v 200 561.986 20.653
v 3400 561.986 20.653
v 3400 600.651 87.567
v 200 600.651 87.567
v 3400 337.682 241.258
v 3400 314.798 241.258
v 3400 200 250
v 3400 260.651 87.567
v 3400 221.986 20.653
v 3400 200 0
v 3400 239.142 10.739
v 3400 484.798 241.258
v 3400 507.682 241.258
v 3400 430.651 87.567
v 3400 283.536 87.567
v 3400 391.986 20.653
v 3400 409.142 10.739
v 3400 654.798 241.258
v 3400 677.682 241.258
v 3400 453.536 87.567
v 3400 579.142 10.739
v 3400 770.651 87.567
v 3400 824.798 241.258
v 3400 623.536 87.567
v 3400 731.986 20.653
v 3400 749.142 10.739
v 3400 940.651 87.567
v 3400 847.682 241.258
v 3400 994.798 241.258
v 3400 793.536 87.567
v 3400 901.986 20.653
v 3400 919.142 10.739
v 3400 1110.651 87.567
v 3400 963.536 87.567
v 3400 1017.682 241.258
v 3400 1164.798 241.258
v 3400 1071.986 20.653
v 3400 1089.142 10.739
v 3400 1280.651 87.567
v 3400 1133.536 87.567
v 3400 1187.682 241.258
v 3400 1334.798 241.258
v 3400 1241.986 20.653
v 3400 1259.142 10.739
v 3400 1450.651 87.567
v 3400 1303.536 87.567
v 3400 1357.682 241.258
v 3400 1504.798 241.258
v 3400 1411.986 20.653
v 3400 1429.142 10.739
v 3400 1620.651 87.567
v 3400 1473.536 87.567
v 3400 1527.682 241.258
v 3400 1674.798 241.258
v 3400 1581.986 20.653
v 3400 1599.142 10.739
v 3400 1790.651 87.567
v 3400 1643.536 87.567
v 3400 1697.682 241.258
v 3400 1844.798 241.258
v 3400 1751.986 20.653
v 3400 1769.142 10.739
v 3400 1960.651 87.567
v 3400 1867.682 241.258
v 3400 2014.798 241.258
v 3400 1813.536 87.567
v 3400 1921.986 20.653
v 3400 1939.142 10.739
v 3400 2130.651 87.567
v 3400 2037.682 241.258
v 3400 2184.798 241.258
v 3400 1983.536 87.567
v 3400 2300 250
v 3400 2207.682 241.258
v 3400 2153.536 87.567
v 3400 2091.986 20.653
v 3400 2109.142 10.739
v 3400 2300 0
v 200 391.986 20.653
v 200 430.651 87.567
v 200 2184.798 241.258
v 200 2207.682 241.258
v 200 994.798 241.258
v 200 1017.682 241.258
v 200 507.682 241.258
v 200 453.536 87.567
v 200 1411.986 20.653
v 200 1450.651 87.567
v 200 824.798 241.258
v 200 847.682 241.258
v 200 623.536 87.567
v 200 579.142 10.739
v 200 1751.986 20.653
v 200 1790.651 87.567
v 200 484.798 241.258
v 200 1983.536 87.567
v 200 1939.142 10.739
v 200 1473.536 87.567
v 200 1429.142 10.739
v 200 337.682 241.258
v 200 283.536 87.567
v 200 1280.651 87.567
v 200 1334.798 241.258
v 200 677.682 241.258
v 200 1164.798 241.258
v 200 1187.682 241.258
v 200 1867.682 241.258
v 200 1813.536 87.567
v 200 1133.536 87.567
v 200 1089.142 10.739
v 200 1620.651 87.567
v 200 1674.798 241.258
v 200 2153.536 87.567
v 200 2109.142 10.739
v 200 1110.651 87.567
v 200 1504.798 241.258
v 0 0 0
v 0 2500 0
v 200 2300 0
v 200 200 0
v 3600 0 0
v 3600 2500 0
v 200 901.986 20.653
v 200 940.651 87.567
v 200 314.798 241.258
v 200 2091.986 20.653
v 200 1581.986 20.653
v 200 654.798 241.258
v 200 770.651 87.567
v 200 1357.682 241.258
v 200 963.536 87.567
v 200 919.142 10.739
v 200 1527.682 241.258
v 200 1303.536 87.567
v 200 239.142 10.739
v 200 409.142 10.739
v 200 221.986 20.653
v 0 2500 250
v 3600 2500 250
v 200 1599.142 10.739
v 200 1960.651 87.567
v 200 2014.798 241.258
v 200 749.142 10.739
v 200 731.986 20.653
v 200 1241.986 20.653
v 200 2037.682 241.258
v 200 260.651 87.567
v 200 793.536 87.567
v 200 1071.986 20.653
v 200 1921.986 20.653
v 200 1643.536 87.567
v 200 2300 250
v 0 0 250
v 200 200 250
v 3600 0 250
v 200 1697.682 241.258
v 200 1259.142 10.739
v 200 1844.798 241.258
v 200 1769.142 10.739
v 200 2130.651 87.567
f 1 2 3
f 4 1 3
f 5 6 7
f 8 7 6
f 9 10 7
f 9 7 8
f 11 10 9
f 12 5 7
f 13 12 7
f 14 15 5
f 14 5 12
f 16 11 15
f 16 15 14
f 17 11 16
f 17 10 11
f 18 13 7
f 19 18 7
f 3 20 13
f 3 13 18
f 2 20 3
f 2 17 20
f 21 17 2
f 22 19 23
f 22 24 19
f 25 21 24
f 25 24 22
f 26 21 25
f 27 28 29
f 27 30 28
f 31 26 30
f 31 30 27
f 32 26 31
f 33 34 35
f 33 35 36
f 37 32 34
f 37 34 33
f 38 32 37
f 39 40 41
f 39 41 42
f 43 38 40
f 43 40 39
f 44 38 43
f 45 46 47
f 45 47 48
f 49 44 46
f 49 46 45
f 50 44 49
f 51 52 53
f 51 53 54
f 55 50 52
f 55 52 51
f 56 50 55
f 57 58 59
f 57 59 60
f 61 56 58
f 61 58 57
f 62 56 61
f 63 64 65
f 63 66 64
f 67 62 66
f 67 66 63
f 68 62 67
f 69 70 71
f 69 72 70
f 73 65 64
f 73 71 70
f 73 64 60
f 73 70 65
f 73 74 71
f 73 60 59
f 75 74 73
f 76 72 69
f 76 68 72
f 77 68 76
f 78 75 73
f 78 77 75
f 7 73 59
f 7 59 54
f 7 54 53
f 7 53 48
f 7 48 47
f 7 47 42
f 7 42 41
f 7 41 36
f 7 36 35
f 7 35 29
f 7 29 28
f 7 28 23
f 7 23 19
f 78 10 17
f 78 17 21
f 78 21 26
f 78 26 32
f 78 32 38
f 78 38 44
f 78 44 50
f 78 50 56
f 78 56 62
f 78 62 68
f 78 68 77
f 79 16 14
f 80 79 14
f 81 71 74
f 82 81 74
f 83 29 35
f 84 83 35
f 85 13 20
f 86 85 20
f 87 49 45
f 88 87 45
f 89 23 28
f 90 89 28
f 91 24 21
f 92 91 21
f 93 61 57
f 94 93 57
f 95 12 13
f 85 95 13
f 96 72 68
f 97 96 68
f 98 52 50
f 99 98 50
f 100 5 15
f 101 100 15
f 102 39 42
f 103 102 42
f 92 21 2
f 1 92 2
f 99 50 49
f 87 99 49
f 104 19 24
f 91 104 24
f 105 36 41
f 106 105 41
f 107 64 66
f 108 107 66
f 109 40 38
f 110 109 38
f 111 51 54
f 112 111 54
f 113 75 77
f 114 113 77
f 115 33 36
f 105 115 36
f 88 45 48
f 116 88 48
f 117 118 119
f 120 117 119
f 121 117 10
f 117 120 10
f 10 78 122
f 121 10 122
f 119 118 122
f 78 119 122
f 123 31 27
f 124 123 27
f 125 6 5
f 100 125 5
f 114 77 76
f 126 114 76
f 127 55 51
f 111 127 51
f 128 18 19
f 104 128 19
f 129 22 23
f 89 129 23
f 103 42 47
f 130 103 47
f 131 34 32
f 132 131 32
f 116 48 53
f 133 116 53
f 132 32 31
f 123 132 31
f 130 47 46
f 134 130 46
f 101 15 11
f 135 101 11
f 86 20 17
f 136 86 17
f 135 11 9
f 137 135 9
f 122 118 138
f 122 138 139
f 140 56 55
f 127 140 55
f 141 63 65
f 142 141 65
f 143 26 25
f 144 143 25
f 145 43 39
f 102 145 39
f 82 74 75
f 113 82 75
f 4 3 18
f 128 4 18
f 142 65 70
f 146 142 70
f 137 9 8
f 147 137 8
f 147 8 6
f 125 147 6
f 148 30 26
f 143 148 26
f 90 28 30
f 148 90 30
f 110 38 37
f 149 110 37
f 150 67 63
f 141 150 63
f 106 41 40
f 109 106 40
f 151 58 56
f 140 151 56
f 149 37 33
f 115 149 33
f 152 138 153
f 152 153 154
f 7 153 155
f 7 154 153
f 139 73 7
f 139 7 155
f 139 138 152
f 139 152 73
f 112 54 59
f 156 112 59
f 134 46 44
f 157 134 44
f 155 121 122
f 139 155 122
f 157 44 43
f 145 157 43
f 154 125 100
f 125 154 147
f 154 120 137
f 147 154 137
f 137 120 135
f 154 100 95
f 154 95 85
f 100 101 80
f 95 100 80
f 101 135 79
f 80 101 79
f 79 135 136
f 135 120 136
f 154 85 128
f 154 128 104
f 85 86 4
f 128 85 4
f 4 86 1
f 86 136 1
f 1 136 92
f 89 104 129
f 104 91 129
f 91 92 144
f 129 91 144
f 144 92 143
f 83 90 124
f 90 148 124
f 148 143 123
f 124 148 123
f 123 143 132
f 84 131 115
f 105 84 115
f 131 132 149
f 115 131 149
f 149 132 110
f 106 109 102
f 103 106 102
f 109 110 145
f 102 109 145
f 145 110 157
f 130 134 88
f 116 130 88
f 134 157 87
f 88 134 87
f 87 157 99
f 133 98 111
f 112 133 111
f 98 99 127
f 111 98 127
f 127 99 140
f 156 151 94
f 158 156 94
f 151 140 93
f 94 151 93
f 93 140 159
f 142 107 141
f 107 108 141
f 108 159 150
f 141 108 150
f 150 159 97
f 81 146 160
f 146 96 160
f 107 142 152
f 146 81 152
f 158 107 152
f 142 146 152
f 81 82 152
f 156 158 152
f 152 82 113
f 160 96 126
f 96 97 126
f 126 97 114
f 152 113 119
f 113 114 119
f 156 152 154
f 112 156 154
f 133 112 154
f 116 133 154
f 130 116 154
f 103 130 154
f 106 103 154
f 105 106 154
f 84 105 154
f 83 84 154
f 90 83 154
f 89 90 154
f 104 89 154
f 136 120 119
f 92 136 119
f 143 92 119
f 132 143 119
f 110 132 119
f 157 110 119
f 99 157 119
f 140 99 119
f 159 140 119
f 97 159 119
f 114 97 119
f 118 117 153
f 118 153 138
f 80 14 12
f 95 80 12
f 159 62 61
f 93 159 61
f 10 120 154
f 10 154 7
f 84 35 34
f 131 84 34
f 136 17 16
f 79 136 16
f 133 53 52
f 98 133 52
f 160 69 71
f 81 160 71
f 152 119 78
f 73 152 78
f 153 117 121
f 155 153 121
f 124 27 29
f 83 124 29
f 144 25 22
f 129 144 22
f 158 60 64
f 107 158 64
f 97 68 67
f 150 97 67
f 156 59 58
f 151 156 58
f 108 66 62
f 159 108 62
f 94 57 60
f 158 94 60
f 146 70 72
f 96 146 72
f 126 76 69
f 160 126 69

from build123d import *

# Parameters (mm, degrees)
SKETCH1_W           = 3600
SKETCH1_H           = 2500
SKETCH1_W_2         = 3200
SKETCH1_H_2         = 2100
BOSS_EXTRUDE4_DEPTH = 250
BOSS_EXTRUDE5_DEPTH = 3200
LPATTERN1_COUNT     = 12
LPATTERN1_PITCH     = 170


with BuildPart() as part:
    # Sketch1 → Boss-Extrude4 (new body)
    with BuildSketch(Plane.XY):
        with Locations((1800, 1250)):
            Rectangle(SKETCH1_W, SKETCH1_H)
        with Locations((1800, 1250)):
            Rectangle(SKETCH1_W_2, SKETCH1_H_2, mode=Mode.SUBTRACT)
    extrude(amount=BOSS_EXTRUDE4_DEPTH)

    # Sketch2 → Boss-Extrude5 (add)
    with BuildSketch(Plane.ZY.offset(-3400)):
        Polygon((241.257649794, 337.682377697), (87.566850397, 283.536038596), (10.739106486, 239.142435597), (20.652680925, 221.985964691), (87.566850397, 260.651177586), (241.257649794, 314.797516687), align=None)
    boss_extrude5 = extrude(amount=BOSS_EXTRUDE5_DEPTH)

    # LPattern1: Boss-Extrude5 ×12
    with Locations(*[(0, i * LPATTERN1_PITCH, 0) for i in range(1, LPATTERN1_COUNT)]):
        add(boss_extrude5)


solid = part.part
